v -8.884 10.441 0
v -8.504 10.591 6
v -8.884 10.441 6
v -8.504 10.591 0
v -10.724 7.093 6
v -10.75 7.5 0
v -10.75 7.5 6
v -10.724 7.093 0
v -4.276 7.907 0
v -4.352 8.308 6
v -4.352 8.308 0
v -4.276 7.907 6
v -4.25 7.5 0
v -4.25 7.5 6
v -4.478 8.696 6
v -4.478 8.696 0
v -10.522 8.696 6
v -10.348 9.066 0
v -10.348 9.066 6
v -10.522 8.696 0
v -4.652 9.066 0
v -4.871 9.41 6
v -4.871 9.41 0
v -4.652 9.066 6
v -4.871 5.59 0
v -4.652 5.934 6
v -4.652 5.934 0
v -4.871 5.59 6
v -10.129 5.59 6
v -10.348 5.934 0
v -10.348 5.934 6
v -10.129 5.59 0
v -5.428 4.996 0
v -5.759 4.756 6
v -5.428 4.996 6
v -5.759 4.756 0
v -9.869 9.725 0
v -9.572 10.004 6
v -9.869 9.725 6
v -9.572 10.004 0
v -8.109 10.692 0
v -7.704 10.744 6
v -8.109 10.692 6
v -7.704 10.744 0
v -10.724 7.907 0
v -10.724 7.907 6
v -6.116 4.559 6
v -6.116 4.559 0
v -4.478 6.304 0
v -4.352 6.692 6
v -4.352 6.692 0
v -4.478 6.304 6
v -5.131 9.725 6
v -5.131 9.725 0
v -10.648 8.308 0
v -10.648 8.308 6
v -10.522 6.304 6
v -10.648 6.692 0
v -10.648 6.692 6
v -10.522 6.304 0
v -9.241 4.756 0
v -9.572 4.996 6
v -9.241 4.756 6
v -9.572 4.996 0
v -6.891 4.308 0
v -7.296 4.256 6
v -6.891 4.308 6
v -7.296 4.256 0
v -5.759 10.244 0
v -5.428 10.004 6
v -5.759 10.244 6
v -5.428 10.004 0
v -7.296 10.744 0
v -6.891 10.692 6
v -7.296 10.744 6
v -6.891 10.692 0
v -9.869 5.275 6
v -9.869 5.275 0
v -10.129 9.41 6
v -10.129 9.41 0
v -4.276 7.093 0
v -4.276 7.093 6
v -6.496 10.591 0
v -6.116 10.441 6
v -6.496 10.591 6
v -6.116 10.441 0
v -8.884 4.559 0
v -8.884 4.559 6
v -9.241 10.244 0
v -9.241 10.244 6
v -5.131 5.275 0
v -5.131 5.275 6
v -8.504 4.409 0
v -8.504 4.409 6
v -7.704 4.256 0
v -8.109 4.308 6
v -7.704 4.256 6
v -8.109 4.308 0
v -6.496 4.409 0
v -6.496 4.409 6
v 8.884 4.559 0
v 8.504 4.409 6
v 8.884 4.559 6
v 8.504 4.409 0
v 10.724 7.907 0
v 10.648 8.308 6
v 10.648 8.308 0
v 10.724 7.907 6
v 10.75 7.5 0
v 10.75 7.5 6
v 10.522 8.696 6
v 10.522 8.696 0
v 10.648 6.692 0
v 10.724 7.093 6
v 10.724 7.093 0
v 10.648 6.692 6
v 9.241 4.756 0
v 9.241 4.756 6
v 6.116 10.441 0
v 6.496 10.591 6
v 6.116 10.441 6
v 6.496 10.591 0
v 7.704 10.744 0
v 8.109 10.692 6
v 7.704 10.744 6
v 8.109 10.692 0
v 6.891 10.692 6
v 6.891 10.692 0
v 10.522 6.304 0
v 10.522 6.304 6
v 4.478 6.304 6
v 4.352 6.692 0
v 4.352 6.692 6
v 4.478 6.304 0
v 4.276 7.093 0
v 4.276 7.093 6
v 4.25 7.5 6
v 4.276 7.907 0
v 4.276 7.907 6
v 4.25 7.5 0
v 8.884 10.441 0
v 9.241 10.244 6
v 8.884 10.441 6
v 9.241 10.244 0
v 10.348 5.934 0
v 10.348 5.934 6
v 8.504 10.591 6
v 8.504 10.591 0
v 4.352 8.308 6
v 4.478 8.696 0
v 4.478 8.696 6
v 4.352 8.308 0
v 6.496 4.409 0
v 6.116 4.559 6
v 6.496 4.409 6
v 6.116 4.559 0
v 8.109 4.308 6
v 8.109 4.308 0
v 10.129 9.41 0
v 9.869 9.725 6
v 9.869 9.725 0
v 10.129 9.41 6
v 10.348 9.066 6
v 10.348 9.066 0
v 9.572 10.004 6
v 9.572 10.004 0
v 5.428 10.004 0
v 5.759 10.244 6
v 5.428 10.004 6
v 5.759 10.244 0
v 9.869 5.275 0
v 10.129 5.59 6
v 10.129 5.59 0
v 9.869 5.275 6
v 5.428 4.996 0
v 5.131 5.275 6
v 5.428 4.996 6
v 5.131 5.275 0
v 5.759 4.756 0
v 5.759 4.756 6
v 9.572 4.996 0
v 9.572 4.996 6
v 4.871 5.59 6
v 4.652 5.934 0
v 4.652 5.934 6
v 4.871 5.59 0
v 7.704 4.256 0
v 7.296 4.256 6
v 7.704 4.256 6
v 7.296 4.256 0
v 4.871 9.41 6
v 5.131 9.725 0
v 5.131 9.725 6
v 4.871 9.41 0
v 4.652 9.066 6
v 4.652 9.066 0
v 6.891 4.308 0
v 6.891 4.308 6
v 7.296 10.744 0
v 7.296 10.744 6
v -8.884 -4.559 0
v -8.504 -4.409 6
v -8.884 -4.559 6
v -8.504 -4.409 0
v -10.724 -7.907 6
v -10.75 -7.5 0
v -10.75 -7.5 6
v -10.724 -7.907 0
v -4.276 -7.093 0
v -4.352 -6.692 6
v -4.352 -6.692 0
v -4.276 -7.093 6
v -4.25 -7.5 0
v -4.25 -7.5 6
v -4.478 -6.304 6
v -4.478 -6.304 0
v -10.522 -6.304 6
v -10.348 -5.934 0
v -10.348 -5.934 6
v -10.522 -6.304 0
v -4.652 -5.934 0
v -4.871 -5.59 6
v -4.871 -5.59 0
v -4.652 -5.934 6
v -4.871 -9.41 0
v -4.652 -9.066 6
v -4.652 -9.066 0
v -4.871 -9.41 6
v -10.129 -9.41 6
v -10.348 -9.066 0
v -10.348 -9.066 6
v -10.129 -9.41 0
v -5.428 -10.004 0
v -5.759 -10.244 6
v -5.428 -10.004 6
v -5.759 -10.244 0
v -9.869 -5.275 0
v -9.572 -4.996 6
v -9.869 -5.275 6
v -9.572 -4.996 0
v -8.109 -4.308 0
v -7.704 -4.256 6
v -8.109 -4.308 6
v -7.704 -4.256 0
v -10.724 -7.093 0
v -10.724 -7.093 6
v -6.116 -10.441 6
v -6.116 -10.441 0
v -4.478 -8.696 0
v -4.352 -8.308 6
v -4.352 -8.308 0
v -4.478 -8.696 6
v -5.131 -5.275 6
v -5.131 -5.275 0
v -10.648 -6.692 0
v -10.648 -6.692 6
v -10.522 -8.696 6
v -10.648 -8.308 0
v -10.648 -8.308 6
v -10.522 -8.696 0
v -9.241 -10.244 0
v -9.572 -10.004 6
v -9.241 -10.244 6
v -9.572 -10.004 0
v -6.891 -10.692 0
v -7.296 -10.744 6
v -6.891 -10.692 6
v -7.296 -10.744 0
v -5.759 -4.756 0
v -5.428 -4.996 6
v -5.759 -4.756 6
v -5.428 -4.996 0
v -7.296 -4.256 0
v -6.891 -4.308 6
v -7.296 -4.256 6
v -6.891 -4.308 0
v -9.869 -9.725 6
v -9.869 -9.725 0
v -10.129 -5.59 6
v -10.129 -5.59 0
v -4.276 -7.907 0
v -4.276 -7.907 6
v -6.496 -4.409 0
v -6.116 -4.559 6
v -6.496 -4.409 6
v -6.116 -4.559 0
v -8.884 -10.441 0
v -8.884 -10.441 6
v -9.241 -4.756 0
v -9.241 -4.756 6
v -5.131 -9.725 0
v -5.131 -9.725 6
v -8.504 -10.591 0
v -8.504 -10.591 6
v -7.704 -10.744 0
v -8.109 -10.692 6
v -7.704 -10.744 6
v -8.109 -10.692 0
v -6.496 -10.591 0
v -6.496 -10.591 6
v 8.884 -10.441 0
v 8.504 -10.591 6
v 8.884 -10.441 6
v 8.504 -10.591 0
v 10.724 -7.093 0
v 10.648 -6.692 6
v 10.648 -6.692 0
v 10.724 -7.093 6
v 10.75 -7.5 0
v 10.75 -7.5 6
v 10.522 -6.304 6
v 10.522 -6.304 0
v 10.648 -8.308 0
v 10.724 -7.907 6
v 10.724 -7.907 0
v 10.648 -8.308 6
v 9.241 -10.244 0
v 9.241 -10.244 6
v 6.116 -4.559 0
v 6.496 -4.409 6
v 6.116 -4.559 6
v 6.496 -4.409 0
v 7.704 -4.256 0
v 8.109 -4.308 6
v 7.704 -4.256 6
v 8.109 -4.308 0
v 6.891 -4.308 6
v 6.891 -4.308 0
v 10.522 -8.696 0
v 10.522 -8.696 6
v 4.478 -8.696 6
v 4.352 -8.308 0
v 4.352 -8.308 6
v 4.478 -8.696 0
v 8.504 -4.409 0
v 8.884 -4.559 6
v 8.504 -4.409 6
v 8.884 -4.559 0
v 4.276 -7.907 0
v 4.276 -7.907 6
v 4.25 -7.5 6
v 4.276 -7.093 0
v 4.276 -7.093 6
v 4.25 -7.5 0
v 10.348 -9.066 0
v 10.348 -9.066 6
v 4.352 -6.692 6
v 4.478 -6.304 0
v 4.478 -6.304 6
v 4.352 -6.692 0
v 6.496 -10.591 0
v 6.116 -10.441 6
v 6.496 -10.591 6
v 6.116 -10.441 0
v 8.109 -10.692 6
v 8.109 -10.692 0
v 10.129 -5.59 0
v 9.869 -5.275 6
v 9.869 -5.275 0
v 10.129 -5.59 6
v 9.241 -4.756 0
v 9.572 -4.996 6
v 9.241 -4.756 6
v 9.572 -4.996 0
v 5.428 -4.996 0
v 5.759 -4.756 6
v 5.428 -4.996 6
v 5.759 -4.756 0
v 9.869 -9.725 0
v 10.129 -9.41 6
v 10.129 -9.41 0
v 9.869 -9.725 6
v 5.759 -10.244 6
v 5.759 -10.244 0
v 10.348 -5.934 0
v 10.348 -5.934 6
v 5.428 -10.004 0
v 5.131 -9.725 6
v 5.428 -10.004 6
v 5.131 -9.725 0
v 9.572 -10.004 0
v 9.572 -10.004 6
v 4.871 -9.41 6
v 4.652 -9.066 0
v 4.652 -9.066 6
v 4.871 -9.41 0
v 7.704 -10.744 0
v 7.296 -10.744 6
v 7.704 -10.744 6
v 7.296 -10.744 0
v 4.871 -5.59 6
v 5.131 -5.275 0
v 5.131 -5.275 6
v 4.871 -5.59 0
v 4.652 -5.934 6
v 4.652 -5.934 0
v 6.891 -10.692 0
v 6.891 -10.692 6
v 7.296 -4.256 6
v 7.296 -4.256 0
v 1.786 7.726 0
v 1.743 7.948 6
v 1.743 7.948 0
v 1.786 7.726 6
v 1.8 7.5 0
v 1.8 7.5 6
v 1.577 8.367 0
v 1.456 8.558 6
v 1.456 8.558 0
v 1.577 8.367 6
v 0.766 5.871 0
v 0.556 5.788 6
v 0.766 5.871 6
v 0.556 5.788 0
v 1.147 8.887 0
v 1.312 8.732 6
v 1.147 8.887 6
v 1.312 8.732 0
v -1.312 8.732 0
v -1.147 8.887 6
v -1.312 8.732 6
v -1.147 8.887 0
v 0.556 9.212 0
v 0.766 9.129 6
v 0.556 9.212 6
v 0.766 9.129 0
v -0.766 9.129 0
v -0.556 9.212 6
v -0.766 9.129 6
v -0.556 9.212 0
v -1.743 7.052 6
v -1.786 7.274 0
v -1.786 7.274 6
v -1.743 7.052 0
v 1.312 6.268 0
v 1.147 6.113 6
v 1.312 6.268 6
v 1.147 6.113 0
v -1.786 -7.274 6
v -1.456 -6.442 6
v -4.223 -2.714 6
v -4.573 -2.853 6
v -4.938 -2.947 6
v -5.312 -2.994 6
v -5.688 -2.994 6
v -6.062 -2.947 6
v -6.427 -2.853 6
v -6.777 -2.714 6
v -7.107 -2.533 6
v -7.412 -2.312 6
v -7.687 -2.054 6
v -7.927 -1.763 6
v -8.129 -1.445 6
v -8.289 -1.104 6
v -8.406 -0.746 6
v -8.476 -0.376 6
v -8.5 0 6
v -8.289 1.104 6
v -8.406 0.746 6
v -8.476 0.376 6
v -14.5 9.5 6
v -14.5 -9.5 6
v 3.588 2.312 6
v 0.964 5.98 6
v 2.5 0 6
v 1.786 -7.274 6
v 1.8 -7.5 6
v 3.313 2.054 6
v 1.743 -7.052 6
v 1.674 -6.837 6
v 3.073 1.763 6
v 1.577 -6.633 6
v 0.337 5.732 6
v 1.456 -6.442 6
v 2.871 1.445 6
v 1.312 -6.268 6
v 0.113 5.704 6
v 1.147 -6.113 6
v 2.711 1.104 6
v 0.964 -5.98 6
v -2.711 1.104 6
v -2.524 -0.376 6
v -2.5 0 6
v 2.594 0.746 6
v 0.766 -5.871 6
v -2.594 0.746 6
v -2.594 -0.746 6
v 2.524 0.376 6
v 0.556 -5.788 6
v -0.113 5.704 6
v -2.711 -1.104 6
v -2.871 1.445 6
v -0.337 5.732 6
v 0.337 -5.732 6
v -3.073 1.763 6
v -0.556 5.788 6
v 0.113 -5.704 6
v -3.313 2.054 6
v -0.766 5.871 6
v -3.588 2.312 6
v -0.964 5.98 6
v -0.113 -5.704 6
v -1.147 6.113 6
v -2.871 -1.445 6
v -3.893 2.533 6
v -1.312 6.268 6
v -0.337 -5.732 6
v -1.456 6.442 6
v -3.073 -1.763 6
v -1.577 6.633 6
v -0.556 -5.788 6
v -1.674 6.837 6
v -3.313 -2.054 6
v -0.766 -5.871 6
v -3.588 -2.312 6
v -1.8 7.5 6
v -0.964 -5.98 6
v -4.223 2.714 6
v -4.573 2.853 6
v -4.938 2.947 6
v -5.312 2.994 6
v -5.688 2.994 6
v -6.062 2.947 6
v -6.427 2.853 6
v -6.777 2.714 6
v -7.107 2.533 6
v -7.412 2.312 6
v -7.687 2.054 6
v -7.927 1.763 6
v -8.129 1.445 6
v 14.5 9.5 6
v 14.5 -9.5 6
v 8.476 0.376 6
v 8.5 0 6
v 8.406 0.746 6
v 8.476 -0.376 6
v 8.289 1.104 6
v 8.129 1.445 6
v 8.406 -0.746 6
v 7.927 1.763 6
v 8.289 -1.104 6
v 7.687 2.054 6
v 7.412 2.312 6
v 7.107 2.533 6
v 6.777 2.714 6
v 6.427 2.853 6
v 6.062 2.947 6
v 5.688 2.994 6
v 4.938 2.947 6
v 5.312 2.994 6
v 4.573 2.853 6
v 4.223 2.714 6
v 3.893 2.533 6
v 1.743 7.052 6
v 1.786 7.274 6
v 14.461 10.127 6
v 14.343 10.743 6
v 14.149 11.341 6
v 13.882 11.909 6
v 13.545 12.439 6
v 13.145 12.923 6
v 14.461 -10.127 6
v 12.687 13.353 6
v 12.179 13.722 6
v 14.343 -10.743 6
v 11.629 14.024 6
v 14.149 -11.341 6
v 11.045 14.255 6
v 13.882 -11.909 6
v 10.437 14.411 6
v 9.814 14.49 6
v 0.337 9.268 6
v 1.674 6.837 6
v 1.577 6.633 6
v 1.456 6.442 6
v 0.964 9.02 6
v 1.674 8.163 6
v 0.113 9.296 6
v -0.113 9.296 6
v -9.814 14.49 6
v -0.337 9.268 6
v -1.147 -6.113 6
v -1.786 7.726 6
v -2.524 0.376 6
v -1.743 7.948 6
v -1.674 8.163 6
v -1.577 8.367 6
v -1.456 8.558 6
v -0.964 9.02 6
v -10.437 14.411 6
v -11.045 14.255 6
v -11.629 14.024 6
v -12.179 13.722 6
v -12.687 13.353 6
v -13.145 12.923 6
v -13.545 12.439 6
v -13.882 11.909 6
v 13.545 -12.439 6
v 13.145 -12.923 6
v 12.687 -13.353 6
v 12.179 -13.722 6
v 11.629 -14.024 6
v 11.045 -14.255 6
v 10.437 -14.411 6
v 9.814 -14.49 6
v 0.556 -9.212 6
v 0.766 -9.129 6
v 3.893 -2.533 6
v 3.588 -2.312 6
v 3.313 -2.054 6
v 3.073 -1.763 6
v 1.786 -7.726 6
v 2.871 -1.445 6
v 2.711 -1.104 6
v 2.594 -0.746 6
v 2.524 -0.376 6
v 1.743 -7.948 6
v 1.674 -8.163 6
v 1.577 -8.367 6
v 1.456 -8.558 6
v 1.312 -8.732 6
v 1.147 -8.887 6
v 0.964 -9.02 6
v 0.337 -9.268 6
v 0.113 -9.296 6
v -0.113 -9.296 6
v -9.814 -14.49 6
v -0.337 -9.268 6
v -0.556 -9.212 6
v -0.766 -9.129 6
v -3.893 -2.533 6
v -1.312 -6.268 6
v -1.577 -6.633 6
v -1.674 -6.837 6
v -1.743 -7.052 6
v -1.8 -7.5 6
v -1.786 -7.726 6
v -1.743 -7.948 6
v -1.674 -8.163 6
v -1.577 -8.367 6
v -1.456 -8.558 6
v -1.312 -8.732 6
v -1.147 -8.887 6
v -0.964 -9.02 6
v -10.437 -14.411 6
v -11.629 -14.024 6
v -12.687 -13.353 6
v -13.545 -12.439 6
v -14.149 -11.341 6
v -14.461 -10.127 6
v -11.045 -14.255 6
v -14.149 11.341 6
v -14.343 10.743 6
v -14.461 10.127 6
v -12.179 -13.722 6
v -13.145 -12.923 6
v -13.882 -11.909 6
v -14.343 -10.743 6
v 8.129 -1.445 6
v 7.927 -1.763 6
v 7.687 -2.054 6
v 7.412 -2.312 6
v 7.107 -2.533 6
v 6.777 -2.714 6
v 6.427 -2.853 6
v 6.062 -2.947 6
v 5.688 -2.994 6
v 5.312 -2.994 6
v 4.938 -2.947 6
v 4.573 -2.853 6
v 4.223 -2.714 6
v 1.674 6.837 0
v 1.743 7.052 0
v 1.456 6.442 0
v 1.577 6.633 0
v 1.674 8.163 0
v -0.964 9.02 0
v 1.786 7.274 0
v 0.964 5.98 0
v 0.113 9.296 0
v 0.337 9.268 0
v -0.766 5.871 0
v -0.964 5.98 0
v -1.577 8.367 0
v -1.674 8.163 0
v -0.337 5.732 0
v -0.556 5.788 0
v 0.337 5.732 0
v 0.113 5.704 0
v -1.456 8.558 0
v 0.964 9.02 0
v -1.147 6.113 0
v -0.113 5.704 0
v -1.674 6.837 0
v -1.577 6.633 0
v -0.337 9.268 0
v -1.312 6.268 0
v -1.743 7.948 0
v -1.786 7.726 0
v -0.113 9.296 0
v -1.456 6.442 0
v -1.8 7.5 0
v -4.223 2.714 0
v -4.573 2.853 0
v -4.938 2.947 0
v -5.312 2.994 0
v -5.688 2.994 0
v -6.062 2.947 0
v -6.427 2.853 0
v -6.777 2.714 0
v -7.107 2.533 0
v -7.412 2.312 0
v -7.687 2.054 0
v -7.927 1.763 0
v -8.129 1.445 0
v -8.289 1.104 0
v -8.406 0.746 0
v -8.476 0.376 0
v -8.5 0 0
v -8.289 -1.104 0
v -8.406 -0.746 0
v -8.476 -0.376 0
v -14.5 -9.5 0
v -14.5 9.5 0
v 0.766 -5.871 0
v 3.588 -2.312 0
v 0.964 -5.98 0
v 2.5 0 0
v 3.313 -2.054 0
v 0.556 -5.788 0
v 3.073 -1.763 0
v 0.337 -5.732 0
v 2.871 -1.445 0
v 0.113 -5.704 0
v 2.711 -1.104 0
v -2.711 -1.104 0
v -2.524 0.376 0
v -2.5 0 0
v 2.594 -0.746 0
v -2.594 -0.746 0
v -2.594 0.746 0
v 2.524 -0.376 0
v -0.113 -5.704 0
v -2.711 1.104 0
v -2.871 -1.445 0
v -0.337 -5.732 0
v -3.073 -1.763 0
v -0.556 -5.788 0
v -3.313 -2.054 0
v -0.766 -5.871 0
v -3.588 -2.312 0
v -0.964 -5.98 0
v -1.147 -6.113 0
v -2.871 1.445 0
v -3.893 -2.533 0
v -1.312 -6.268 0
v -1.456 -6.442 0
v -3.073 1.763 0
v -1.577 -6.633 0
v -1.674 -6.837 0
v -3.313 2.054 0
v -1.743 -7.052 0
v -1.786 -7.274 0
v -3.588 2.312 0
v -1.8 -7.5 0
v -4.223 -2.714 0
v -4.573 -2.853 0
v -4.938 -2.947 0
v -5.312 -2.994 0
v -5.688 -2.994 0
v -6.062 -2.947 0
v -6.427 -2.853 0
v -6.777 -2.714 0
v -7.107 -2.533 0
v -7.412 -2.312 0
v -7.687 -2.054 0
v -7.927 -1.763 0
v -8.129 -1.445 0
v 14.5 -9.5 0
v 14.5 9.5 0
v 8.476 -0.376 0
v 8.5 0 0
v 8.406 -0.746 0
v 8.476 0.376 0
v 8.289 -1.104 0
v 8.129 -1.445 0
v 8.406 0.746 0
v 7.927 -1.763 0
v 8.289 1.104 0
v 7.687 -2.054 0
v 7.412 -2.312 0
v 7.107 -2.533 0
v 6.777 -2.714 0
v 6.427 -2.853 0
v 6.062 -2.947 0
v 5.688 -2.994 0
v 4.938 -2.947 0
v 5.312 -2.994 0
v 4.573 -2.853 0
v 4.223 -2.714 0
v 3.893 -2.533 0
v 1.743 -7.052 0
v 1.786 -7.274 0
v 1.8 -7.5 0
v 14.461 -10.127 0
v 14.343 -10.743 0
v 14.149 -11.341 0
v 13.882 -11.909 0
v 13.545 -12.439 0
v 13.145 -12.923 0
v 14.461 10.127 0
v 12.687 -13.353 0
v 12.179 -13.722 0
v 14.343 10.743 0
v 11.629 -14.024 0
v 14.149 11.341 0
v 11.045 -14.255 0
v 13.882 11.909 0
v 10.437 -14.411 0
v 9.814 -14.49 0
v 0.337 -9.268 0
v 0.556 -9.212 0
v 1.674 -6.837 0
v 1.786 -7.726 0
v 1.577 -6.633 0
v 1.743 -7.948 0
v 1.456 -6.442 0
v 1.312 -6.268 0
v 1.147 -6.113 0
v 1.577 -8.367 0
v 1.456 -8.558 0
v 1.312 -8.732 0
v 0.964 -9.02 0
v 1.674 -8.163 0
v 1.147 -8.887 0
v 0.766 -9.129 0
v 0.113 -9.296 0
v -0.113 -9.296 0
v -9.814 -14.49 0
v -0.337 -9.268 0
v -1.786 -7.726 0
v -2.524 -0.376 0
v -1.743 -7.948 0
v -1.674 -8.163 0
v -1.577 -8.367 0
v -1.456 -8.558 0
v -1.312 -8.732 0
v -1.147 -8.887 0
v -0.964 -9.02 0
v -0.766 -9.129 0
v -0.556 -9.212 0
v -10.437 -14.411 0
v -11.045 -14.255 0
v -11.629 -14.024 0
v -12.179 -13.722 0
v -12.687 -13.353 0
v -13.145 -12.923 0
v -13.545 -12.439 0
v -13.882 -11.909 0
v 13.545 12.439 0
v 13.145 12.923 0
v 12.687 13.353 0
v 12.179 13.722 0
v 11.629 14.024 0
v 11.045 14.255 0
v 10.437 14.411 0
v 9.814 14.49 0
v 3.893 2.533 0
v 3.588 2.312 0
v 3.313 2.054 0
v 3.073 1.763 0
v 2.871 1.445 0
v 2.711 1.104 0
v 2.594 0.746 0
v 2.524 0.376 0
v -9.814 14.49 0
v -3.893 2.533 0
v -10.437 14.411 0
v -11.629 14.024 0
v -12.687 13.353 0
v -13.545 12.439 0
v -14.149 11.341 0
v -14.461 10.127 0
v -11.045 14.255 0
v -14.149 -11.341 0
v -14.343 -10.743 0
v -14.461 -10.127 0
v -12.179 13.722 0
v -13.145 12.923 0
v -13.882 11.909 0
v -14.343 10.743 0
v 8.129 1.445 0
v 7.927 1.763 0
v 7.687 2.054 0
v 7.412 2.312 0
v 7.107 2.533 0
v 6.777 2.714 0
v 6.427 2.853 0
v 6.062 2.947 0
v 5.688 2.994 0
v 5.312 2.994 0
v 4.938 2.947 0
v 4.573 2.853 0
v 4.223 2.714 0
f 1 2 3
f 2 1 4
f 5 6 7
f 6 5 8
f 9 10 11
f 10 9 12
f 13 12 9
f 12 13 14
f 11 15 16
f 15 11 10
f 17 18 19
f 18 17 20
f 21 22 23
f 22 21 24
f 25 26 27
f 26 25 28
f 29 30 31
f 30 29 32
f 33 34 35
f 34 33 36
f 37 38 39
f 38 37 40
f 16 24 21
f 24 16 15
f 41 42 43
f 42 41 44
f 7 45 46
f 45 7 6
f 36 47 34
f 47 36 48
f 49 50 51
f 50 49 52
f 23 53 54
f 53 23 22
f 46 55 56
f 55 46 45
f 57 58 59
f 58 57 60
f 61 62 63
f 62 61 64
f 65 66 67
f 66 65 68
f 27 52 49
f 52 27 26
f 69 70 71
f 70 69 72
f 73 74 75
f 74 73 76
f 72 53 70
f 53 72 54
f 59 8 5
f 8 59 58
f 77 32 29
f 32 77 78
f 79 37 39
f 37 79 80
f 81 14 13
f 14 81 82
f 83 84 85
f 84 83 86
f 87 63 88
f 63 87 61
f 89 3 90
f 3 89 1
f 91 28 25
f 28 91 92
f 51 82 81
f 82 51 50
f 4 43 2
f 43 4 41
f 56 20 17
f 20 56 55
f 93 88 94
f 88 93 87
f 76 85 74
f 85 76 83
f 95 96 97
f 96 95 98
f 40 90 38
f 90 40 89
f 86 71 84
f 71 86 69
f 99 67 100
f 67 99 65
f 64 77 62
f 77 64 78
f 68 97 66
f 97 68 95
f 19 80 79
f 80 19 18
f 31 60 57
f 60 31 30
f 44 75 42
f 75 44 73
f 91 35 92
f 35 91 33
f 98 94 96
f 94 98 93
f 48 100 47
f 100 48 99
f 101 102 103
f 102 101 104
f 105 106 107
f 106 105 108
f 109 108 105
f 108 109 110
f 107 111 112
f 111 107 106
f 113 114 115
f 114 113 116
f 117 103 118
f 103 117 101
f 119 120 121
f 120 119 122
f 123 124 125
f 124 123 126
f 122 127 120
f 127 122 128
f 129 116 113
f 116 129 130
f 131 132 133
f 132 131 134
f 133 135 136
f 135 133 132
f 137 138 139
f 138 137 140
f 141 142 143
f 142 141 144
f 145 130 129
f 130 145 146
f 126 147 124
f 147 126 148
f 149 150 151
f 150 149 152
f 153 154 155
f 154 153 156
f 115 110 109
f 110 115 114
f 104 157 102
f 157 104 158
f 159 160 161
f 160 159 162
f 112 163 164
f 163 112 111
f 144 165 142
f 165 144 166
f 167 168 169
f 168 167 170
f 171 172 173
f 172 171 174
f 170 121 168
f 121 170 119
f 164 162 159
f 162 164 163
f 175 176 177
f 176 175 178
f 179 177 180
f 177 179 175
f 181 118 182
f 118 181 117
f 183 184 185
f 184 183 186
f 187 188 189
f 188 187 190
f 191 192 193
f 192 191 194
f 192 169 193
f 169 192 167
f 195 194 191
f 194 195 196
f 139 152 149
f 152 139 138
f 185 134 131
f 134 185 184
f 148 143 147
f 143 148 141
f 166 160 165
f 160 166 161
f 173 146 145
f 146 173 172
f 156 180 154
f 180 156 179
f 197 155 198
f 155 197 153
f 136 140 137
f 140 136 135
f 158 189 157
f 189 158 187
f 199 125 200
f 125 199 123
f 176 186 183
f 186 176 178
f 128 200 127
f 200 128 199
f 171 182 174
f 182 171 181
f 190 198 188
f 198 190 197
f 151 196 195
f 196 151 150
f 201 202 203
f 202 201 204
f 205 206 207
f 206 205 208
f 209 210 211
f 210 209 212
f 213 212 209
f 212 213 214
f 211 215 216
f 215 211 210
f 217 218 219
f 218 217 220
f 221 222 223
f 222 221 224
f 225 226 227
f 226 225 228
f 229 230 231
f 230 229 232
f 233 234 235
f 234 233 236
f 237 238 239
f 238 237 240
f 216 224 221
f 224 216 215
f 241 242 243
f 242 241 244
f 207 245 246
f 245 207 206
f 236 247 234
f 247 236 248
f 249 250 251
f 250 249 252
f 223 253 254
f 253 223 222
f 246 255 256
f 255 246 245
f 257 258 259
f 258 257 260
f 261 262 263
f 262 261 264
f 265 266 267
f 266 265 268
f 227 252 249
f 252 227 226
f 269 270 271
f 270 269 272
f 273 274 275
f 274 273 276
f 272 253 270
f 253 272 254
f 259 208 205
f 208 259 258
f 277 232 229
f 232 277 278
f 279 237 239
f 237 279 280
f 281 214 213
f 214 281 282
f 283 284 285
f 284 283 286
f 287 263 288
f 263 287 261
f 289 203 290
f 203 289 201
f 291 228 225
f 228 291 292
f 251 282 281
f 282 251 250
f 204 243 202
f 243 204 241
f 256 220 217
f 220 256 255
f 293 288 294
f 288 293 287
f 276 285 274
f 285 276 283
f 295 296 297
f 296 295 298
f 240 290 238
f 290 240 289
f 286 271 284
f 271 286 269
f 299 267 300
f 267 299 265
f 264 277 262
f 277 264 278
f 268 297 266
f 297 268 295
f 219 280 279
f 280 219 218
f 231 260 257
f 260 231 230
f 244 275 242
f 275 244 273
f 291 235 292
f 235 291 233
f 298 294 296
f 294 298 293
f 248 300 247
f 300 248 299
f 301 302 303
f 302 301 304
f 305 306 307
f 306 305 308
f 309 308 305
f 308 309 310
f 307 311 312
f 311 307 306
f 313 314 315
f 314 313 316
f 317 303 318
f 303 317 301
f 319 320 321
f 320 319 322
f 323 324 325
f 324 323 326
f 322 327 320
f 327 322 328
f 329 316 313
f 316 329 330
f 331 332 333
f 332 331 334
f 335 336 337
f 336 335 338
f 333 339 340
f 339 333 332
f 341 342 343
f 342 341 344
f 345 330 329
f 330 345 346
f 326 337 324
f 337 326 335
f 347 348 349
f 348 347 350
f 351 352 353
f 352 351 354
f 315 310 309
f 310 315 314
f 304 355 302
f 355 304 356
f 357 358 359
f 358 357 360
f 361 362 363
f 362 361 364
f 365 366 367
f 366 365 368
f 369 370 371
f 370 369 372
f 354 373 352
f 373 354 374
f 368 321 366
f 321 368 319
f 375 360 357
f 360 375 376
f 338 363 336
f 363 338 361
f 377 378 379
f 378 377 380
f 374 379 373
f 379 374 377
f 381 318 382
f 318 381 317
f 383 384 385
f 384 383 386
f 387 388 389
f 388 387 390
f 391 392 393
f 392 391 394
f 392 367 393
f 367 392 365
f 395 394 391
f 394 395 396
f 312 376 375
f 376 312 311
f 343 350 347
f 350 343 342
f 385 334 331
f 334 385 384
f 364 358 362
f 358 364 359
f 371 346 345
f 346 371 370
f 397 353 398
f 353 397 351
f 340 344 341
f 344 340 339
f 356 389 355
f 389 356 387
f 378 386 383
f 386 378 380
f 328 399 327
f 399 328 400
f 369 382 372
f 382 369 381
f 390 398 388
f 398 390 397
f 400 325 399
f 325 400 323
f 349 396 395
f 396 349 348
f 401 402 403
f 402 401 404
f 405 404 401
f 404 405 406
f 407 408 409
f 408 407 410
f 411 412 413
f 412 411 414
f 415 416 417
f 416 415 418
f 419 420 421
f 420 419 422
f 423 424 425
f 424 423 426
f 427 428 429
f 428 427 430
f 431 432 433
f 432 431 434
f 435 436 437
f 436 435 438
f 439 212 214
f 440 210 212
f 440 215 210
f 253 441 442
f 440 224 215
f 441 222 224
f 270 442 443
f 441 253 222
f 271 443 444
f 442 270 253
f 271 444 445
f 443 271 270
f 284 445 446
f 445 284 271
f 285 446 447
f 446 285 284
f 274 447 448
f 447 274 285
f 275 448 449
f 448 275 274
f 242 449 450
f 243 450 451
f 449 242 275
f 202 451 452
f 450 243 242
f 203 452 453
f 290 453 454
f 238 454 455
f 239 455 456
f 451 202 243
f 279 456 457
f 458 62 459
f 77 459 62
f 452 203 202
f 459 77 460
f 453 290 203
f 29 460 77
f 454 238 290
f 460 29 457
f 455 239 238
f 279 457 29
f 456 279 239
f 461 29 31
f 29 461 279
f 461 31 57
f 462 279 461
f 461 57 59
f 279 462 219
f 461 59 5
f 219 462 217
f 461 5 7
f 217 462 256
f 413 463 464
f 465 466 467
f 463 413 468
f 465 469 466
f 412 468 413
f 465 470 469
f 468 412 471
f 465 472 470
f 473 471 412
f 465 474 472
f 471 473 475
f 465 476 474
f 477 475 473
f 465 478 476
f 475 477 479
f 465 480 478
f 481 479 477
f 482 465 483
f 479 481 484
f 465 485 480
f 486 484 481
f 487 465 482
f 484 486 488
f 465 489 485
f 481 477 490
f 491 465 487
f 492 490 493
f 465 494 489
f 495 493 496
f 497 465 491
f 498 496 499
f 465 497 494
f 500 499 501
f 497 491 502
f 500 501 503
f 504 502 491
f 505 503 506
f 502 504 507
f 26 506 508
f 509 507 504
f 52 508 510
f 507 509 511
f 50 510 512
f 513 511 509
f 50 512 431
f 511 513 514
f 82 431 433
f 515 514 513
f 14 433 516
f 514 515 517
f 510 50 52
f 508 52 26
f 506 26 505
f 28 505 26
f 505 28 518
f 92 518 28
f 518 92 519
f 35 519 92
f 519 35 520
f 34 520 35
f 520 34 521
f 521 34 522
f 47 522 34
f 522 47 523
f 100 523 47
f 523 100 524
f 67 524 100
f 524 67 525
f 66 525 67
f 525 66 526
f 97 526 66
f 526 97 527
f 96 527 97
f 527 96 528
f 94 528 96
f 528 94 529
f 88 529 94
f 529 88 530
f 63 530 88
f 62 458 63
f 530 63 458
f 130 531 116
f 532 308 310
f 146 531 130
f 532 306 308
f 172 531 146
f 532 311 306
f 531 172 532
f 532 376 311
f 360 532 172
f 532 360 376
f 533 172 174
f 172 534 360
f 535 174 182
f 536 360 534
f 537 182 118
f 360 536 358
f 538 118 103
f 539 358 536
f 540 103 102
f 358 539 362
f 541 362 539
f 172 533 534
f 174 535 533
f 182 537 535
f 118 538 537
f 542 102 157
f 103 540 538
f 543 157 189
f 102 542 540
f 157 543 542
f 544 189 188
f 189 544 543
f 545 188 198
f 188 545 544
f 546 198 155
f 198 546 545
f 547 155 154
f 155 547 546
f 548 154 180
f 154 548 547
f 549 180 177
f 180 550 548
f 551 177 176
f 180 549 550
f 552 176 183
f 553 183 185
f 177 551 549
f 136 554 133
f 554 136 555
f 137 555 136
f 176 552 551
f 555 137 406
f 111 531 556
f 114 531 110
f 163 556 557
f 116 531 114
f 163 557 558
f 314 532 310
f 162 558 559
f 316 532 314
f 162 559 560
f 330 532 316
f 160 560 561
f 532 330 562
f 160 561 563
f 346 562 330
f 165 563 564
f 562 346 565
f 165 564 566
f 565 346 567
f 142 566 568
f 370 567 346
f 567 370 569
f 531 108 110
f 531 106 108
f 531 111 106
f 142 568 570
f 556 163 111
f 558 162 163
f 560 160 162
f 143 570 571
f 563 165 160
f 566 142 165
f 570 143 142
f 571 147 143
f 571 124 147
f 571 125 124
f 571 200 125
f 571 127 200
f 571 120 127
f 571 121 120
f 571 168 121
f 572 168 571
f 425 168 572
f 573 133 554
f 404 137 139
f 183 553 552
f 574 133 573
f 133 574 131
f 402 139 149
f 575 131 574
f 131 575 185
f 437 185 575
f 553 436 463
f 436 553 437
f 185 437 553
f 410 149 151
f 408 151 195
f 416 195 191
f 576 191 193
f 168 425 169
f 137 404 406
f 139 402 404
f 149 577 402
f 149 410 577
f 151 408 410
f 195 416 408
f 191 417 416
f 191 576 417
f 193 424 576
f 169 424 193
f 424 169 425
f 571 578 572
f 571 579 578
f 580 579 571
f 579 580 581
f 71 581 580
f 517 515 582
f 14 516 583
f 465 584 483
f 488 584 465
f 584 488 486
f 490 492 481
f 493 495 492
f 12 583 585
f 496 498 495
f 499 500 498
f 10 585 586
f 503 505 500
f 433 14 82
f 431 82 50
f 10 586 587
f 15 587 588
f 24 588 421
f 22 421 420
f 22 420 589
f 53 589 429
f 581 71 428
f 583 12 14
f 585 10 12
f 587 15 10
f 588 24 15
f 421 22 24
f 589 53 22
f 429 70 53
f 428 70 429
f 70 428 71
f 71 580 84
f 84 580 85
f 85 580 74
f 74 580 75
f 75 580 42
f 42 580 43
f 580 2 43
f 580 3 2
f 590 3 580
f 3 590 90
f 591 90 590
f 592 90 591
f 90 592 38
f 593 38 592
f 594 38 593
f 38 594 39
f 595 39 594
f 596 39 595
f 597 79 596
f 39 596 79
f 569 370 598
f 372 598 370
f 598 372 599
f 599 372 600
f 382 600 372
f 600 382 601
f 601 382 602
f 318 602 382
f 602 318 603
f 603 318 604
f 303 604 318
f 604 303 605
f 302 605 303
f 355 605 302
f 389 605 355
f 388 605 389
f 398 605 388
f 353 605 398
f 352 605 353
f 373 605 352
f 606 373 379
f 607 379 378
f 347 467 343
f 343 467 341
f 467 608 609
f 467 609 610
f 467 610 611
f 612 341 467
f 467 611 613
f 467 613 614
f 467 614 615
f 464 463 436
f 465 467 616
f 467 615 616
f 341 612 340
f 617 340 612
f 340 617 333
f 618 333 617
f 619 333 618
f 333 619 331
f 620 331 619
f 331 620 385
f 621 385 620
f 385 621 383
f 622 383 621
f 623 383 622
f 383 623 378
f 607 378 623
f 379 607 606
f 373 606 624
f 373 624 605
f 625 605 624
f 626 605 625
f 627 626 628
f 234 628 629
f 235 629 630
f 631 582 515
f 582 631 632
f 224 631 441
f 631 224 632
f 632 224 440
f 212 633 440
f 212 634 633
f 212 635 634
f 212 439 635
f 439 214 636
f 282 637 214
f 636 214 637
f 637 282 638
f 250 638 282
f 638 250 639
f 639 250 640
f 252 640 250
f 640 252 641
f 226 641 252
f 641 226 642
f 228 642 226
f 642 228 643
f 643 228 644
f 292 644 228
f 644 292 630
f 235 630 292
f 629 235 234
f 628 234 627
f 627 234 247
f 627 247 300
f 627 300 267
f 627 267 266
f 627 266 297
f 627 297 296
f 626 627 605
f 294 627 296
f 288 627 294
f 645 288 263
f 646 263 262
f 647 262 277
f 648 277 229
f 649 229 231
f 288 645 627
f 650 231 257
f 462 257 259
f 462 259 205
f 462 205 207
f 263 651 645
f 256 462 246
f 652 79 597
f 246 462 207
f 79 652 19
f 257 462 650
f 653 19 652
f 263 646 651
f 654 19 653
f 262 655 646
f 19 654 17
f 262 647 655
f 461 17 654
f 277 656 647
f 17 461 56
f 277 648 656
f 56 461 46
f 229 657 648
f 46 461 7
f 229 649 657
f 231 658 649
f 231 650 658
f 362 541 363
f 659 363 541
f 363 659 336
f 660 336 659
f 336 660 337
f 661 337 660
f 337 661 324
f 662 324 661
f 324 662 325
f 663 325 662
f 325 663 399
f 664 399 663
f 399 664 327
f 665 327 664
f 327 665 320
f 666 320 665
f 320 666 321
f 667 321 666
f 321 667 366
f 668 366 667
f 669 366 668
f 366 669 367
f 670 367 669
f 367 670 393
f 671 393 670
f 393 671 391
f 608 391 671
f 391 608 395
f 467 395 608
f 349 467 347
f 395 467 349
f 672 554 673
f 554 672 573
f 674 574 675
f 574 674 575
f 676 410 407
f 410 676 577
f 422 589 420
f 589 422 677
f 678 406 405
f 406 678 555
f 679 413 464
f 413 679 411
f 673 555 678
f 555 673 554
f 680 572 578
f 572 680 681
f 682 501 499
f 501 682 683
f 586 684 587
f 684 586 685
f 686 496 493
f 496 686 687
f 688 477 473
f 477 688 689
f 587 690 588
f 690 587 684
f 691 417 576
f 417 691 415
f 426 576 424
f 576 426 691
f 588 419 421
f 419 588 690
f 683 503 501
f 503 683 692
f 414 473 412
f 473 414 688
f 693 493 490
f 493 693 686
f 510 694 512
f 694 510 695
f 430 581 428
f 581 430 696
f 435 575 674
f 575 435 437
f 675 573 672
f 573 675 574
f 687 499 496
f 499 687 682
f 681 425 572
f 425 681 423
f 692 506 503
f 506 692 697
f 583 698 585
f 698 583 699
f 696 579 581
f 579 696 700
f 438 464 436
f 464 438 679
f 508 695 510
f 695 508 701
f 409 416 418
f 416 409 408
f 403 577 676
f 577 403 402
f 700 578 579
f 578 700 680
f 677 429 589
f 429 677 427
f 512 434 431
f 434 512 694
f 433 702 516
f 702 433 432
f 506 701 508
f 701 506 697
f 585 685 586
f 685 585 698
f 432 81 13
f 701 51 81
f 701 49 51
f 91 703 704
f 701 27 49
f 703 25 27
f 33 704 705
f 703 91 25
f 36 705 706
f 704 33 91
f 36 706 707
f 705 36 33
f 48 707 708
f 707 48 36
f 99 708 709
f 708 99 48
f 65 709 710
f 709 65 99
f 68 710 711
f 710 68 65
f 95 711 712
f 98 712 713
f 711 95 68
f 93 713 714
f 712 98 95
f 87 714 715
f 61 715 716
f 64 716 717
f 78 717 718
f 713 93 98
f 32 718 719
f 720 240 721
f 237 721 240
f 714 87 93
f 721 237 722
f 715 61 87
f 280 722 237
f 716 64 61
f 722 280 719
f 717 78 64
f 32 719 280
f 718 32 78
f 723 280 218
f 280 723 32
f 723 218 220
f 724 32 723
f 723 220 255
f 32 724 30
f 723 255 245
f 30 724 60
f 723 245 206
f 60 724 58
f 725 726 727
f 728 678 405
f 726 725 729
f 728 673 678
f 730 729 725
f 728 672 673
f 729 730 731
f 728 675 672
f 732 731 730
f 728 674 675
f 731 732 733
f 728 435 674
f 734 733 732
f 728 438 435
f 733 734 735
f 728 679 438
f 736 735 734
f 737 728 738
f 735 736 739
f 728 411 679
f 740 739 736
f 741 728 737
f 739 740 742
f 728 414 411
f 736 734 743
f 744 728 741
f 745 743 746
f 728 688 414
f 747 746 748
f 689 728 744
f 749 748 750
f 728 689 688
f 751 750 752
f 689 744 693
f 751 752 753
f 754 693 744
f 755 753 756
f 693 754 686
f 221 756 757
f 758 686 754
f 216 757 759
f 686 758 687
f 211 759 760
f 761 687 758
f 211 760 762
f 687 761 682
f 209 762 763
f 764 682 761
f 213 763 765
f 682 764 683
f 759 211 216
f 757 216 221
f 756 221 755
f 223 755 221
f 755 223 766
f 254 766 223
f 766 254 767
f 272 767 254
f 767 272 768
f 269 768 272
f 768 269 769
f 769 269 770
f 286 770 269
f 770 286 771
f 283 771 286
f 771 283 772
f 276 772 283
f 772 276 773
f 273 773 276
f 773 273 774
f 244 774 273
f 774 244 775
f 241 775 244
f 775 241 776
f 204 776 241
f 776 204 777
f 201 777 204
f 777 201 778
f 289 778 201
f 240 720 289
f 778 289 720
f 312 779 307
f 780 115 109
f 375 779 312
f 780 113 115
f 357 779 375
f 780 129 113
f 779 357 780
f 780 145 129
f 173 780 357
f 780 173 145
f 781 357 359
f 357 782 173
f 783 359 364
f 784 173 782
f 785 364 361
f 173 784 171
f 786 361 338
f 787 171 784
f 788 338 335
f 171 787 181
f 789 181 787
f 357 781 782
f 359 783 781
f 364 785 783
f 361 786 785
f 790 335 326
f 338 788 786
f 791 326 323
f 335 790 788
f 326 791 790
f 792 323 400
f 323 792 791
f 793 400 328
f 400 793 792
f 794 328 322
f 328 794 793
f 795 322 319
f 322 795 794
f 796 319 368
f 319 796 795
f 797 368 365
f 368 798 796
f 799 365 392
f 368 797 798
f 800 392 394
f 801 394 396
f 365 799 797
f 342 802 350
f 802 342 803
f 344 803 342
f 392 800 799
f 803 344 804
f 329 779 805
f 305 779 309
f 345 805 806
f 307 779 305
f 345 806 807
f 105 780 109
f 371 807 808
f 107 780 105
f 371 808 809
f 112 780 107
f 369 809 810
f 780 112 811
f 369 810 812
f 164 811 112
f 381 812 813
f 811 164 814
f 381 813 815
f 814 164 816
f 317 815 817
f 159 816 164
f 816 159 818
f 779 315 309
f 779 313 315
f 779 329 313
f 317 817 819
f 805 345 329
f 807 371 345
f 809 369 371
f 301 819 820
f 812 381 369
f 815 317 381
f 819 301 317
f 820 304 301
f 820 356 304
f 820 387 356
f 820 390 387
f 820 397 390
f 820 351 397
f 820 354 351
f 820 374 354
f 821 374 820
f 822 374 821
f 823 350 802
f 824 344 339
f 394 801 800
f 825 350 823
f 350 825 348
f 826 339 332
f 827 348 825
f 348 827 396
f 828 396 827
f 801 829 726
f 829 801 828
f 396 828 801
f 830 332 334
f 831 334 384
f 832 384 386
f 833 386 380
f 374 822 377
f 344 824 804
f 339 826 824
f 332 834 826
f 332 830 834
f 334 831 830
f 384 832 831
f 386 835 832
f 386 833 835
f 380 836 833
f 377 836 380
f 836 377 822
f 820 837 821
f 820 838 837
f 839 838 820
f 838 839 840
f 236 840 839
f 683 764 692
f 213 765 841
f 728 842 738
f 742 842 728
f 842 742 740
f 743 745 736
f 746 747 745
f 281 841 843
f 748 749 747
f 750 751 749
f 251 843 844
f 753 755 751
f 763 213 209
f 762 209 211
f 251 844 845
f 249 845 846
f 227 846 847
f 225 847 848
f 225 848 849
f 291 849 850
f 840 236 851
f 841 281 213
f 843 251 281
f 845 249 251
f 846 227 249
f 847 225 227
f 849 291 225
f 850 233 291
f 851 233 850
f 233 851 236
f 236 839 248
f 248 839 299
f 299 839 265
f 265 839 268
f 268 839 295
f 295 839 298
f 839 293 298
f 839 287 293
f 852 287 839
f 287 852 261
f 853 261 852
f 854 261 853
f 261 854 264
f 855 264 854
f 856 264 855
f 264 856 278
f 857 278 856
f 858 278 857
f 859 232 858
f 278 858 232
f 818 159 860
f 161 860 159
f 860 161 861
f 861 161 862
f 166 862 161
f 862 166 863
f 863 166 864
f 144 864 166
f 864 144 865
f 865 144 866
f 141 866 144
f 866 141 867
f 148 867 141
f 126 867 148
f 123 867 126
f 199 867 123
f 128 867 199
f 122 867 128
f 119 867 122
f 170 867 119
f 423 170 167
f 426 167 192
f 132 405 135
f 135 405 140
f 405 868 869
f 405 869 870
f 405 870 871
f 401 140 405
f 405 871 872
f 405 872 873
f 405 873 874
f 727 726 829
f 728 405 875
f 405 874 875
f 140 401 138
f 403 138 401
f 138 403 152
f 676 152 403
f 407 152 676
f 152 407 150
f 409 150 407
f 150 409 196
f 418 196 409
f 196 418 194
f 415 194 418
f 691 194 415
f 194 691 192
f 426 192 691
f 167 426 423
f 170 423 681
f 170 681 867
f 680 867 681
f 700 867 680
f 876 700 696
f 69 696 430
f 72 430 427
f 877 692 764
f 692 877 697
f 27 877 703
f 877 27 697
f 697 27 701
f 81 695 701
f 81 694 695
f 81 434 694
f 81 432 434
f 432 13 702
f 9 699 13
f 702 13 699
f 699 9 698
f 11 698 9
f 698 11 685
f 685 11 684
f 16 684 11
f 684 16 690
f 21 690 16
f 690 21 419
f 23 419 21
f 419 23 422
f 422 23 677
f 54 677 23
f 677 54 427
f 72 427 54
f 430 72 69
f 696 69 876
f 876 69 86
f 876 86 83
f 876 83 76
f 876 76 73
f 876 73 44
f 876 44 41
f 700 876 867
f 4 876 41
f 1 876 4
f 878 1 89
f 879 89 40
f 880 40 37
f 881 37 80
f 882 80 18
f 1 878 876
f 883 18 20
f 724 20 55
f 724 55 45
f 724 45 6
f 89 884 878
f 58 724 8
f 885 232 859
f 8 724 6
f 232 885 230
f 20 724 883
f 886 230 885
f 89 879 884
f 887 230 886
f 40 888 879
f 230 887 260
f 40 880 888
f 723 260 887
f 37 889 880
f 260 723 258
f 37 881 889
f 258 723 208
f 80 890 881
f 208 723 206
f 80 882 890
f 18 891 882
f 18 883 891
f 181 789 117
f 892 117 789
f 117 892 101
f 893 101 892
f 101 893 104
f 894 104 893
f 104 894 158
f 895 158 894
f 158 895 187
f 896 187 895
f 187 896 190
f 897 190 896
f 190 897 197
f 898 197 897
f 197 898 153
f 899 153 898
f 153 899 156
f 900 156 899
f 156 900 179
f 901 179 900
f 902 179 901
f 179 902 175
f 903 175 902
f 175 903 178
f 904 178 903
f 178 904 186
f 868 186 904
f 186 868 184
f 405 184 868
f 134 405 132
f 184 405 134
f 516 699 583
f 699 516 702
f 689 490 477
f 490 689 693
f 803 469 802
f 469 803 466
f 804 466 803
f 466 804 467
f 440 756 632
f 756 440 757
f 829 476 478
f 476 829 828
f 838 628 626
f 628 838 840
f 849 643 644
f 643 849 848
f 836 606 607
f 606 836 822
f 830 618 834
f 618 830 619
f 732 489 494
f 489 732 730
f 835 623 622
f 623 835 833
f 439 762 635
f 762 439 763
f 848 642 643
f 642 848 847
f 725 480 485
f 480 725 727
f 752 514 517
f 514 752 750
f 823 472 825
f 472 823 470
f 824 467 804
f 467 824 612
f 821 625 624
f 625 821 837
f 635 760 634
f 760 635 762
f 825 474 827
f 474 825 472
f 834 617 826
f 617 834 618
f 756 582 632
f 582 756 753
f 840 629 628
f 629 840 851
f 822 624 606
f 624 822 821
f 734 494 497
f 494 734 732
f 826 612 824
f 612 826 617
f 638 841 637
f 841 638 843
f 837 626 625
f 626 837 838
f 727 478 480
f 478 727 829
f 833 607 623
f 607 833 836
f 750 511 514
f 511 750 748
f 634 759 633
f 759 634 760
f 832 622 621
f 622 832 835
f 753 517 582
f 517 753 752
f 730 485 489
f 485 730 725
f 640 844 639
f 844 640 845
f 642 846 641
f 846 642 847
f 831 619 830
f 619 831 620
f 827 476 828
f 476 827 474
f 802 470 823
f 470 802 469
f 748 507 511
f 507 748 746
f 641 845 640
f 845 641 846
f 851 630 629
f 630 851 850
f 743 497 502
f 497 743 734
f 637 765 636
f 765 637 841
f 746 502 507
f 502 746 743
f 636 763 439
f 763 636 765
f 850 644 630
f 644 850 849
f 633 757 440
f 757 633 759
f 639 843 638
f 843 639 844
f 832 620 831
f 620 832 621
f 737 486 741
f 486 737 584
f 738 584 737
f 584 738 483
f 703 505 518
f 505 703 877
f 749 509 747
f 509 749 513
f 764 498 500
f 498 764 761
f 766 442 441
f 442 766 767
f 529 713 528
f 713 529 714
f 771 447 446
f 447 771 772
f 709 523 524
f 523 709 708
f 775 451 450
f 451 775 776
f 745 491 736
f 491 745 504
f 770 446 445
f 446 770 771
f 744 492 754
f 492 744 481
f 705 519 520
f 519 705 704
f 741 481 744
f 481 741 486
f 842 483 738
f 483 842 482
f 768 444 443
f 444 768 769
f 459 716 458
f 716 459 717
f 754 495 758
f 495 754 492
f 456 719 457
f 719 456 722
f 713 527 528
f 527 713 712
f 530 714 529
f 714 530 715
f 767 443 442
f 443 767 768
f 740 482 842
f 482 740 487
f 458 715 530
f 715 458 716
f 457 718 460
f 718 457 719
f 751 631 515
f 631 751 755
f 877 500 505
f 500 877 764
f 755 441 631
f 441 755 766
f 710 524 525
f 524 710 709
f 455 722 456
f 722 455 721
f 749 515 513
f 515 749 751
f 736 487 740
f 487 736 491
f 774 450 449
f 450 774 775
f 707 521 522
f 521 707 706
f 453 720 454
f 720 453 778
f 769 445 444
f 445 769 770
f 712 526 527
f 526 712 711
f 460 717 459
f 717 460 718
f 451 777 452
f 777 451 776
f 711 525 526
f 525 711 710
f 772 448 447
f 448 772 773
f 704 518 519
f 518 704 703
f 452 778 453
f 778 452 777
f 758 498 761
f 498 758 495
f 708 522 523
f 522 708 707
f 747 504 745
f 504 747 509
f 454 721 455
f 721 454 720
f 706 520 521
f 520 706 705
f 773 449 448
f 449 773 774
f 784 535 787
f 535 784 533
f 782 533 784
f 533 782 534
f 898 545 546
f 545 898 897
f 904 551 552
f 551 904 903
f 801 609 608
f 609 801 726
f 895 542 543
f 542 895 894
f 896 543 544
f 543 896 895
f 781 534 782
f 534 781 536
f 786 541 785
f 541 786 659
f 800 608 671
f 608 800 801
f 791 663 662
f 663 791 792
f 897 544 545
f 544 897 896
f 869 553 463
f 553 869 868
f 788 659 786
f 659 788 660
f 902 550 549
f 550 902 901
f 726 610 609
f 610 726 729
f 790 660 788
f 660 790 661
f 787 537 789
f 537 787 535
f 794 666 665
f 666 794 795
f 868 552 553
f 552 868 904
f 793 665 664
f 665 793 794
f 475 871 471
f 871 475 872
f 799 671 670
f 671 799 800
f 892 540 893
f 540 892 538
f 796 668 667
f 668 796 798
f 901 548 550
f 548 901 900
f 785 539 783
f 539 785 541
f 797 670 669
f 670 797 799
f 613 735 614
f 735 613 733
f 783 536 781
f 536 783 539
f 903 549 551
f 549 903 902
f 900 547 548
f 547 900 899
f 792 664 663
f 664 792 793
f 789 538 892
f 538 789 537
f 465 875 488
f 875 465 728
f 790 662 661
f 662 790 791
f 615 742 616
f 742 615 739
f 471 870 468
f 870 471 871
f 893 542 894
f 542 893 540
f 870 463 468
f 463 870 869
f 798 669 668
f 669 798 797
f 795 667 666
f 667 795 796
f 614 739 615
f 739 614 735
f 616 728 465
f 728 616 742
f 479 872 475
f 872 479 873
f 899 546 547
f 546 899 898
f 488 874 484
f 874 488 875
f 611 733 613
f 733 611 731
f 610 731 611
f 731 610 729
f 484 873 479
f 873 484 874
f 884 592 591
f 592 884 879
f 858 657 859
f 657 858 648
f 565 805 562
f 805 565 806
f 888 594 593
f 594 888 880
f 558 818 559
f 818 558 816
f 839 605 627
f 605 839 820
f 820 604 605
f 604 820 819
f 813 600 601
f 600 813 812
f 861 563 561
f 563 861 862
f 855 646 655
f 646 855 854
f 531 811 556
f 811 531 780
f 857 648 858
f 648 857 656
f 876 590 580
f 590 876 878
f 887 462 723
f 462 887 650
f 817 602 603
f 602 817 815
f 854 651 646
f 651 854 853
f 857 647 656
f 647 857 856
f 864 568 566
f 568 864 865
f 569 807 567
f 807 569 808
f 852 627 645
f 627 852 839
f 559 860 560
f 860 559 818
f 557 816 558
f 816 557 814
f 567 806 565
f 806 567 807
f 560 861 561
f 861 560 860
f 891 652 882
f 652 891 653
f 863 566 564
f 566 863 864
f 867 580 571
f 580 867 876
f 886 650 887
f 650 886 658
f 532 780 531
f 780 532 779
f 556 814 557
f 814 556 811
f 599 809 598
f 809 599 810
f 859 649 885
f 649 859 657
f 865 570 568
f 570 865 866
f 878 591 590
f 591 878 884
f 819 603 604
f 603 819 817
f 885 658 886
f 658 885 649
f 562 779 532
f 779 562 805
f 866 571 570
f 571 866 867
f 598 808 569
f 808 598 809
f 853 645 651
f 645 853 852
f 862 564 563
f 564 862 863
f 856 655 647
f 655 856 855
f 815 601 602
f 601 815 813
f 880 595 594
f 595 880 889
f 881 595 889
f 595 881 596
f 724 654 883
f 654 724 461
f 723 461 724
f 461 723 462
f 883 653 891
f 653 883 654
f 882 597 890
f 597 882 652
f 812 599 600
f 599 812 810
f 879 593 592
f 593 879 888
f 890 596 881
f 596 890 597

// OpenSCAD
$fn = 50;


difference() {
	union() {
		hull() {
			translate(v = [-9.5000000000, 9.5000000000, 0]) {
				cylinder(h = 6, r = 5);
			}
			translate(v = [9.5000000000, 9.5000000000, 0]) {
				cylinder(h = 6, r = 5);
			}
			translate(v = [-9.5000000000, -9.5000000000, 0]) {
				cylinder(h = 6, r = 5);
			}
			translate(v = [9.5000000000, -9.5000000000, 0]) {
				cylinder(h = 6, r = 5);
			}
		}
	}
	union() {
		#translate(v = [-7.5000000000, 7.5000000000, 0]) {
			cylinder(h = 6, r = 3.2500000000);
		}
		#translate(v = [7.5000000000, 7.5000000000, 0]) {
			cylinder(h = 6, r = 3.2500000000);
		}
		#translate(v = [-7.5000000000, -7.5000000000, 0]) {
			cylinder(h = 6, r = 3.2500000000);
		}
		#translate(v = [7.5000000000, -7.5000000000, 0]) {
			cylinder(h = 6, r = 3.2500000000);
		}
		#translate(v = [-7.5000000000, -7.5000000000, -100.0000000000]) {
			cylinder(h = 200, r = 3.2500000000);
		}
		#translate(v = [-7.5000000000, 7.5000000000, -100.0000000000]) {
			cylinder(h = 200, r = 3.2500000000);
		}
		#translate(v = [7.5000000000, -7.5000000000, -100.0000000000]) {
			cylinder(h = 200, r = 3.2500000000);
		}
		#translate(v = [7.5000000000, 7.5000000000, -100.0000000000]) {
			cylinder(h = 200, r = 3.2500000000);
		}
		#translate(v = [-7.5000000000, 7.5000000000, 0]) {
			cylinder(h = 6, r = 1.8000000000);
		}
		#translate(v = [0.0000000000, 7.5000000000, 0]) {
			cylinder(h = 6, r = 1.8000000000);
		}
		#translate(v = [7.5000000000, 7.5000000000, 0]) {
			cylinder(h = 6, r = 1.8000000000);
		}
		#translate(v = [-7.5000000000, -7.5000000000, 0]) {
			cylinder(h = 6, r = 1.8000000000);
		}
		#translate(v = [0.0000000000, -7.5000000000, 0]) {
			cylinder(h = 6, r = 1.8000000000);
		}
		#translate(v = [7.5000000000, -7.5000000000, 0]) {
			cylinder(h = 6, r = 1.8000000000);
		}
		#translate(v = [-7.5000000000, 7.5000000000, 0]) {
			cylinder(h = 6, r = 1.8000000000);
		}
		#translate(v = [0.0000000000, 7.5000000000, 0]) {
			cylinder(h = 6, r = 1.8000000000);
		}
		#translate(v = [7.5000000000, 7.5000000000, 0]) {
			cylinder(h = 6, r = 1.8000000000);
		}
		#translate(v = [-7.5000000000, -7.5000000000, 0]) {
			cylinder(h = 6, r = 1.8000000000);
		}
		#translate(v = [0.0000000000, -7.5000000000, 0]) {
			cylinder(h = 6, r = 1.8000000000);
		}
		#translate(v = [7.5000000000, -7.5000000000, 0]) {
			cylinder(h = 6, r = 1.8000000000);
		}
		#translate(v = [-7.5000000000, 7.5000000000, 0]) {
			cylinder(h = 6, r = 1.8000000000);
		}
		#translate(v = [0.0000000000, 7.5000000000, 0]) {
			cylinder(h = 6, r = 1.8000000000);
		}
		#translate(v = [7.5000000000, 7.5000000000, 0]) {
			cylinder(h = 6, r = 1.8000000000);
		}
		#translate(v = [-7.5000000000, -7.5000000000, 0]) {
			cylinder(h = 6, r = 1.8000000000);
		}
		#translate(v = [0.0000000000, -7.5000000000, 0]) {
			cylinder(h = 6, r = 1.8000000000);
		}
		#translate(v = [7.5000000000, -7.5000000000, 0]) {
			cylinder(h = 6, r = 1.8000000000);
		}
		#translate(v = [-5.5000000000, 0, 0]) {
			cylinder(h = 6, r = 3.0000000000);
		}
		#translate(v = [5.5000000000, 0, 0]) {
			cylinder(h = 6, r = 3.0000000000);
		}
	}
}
